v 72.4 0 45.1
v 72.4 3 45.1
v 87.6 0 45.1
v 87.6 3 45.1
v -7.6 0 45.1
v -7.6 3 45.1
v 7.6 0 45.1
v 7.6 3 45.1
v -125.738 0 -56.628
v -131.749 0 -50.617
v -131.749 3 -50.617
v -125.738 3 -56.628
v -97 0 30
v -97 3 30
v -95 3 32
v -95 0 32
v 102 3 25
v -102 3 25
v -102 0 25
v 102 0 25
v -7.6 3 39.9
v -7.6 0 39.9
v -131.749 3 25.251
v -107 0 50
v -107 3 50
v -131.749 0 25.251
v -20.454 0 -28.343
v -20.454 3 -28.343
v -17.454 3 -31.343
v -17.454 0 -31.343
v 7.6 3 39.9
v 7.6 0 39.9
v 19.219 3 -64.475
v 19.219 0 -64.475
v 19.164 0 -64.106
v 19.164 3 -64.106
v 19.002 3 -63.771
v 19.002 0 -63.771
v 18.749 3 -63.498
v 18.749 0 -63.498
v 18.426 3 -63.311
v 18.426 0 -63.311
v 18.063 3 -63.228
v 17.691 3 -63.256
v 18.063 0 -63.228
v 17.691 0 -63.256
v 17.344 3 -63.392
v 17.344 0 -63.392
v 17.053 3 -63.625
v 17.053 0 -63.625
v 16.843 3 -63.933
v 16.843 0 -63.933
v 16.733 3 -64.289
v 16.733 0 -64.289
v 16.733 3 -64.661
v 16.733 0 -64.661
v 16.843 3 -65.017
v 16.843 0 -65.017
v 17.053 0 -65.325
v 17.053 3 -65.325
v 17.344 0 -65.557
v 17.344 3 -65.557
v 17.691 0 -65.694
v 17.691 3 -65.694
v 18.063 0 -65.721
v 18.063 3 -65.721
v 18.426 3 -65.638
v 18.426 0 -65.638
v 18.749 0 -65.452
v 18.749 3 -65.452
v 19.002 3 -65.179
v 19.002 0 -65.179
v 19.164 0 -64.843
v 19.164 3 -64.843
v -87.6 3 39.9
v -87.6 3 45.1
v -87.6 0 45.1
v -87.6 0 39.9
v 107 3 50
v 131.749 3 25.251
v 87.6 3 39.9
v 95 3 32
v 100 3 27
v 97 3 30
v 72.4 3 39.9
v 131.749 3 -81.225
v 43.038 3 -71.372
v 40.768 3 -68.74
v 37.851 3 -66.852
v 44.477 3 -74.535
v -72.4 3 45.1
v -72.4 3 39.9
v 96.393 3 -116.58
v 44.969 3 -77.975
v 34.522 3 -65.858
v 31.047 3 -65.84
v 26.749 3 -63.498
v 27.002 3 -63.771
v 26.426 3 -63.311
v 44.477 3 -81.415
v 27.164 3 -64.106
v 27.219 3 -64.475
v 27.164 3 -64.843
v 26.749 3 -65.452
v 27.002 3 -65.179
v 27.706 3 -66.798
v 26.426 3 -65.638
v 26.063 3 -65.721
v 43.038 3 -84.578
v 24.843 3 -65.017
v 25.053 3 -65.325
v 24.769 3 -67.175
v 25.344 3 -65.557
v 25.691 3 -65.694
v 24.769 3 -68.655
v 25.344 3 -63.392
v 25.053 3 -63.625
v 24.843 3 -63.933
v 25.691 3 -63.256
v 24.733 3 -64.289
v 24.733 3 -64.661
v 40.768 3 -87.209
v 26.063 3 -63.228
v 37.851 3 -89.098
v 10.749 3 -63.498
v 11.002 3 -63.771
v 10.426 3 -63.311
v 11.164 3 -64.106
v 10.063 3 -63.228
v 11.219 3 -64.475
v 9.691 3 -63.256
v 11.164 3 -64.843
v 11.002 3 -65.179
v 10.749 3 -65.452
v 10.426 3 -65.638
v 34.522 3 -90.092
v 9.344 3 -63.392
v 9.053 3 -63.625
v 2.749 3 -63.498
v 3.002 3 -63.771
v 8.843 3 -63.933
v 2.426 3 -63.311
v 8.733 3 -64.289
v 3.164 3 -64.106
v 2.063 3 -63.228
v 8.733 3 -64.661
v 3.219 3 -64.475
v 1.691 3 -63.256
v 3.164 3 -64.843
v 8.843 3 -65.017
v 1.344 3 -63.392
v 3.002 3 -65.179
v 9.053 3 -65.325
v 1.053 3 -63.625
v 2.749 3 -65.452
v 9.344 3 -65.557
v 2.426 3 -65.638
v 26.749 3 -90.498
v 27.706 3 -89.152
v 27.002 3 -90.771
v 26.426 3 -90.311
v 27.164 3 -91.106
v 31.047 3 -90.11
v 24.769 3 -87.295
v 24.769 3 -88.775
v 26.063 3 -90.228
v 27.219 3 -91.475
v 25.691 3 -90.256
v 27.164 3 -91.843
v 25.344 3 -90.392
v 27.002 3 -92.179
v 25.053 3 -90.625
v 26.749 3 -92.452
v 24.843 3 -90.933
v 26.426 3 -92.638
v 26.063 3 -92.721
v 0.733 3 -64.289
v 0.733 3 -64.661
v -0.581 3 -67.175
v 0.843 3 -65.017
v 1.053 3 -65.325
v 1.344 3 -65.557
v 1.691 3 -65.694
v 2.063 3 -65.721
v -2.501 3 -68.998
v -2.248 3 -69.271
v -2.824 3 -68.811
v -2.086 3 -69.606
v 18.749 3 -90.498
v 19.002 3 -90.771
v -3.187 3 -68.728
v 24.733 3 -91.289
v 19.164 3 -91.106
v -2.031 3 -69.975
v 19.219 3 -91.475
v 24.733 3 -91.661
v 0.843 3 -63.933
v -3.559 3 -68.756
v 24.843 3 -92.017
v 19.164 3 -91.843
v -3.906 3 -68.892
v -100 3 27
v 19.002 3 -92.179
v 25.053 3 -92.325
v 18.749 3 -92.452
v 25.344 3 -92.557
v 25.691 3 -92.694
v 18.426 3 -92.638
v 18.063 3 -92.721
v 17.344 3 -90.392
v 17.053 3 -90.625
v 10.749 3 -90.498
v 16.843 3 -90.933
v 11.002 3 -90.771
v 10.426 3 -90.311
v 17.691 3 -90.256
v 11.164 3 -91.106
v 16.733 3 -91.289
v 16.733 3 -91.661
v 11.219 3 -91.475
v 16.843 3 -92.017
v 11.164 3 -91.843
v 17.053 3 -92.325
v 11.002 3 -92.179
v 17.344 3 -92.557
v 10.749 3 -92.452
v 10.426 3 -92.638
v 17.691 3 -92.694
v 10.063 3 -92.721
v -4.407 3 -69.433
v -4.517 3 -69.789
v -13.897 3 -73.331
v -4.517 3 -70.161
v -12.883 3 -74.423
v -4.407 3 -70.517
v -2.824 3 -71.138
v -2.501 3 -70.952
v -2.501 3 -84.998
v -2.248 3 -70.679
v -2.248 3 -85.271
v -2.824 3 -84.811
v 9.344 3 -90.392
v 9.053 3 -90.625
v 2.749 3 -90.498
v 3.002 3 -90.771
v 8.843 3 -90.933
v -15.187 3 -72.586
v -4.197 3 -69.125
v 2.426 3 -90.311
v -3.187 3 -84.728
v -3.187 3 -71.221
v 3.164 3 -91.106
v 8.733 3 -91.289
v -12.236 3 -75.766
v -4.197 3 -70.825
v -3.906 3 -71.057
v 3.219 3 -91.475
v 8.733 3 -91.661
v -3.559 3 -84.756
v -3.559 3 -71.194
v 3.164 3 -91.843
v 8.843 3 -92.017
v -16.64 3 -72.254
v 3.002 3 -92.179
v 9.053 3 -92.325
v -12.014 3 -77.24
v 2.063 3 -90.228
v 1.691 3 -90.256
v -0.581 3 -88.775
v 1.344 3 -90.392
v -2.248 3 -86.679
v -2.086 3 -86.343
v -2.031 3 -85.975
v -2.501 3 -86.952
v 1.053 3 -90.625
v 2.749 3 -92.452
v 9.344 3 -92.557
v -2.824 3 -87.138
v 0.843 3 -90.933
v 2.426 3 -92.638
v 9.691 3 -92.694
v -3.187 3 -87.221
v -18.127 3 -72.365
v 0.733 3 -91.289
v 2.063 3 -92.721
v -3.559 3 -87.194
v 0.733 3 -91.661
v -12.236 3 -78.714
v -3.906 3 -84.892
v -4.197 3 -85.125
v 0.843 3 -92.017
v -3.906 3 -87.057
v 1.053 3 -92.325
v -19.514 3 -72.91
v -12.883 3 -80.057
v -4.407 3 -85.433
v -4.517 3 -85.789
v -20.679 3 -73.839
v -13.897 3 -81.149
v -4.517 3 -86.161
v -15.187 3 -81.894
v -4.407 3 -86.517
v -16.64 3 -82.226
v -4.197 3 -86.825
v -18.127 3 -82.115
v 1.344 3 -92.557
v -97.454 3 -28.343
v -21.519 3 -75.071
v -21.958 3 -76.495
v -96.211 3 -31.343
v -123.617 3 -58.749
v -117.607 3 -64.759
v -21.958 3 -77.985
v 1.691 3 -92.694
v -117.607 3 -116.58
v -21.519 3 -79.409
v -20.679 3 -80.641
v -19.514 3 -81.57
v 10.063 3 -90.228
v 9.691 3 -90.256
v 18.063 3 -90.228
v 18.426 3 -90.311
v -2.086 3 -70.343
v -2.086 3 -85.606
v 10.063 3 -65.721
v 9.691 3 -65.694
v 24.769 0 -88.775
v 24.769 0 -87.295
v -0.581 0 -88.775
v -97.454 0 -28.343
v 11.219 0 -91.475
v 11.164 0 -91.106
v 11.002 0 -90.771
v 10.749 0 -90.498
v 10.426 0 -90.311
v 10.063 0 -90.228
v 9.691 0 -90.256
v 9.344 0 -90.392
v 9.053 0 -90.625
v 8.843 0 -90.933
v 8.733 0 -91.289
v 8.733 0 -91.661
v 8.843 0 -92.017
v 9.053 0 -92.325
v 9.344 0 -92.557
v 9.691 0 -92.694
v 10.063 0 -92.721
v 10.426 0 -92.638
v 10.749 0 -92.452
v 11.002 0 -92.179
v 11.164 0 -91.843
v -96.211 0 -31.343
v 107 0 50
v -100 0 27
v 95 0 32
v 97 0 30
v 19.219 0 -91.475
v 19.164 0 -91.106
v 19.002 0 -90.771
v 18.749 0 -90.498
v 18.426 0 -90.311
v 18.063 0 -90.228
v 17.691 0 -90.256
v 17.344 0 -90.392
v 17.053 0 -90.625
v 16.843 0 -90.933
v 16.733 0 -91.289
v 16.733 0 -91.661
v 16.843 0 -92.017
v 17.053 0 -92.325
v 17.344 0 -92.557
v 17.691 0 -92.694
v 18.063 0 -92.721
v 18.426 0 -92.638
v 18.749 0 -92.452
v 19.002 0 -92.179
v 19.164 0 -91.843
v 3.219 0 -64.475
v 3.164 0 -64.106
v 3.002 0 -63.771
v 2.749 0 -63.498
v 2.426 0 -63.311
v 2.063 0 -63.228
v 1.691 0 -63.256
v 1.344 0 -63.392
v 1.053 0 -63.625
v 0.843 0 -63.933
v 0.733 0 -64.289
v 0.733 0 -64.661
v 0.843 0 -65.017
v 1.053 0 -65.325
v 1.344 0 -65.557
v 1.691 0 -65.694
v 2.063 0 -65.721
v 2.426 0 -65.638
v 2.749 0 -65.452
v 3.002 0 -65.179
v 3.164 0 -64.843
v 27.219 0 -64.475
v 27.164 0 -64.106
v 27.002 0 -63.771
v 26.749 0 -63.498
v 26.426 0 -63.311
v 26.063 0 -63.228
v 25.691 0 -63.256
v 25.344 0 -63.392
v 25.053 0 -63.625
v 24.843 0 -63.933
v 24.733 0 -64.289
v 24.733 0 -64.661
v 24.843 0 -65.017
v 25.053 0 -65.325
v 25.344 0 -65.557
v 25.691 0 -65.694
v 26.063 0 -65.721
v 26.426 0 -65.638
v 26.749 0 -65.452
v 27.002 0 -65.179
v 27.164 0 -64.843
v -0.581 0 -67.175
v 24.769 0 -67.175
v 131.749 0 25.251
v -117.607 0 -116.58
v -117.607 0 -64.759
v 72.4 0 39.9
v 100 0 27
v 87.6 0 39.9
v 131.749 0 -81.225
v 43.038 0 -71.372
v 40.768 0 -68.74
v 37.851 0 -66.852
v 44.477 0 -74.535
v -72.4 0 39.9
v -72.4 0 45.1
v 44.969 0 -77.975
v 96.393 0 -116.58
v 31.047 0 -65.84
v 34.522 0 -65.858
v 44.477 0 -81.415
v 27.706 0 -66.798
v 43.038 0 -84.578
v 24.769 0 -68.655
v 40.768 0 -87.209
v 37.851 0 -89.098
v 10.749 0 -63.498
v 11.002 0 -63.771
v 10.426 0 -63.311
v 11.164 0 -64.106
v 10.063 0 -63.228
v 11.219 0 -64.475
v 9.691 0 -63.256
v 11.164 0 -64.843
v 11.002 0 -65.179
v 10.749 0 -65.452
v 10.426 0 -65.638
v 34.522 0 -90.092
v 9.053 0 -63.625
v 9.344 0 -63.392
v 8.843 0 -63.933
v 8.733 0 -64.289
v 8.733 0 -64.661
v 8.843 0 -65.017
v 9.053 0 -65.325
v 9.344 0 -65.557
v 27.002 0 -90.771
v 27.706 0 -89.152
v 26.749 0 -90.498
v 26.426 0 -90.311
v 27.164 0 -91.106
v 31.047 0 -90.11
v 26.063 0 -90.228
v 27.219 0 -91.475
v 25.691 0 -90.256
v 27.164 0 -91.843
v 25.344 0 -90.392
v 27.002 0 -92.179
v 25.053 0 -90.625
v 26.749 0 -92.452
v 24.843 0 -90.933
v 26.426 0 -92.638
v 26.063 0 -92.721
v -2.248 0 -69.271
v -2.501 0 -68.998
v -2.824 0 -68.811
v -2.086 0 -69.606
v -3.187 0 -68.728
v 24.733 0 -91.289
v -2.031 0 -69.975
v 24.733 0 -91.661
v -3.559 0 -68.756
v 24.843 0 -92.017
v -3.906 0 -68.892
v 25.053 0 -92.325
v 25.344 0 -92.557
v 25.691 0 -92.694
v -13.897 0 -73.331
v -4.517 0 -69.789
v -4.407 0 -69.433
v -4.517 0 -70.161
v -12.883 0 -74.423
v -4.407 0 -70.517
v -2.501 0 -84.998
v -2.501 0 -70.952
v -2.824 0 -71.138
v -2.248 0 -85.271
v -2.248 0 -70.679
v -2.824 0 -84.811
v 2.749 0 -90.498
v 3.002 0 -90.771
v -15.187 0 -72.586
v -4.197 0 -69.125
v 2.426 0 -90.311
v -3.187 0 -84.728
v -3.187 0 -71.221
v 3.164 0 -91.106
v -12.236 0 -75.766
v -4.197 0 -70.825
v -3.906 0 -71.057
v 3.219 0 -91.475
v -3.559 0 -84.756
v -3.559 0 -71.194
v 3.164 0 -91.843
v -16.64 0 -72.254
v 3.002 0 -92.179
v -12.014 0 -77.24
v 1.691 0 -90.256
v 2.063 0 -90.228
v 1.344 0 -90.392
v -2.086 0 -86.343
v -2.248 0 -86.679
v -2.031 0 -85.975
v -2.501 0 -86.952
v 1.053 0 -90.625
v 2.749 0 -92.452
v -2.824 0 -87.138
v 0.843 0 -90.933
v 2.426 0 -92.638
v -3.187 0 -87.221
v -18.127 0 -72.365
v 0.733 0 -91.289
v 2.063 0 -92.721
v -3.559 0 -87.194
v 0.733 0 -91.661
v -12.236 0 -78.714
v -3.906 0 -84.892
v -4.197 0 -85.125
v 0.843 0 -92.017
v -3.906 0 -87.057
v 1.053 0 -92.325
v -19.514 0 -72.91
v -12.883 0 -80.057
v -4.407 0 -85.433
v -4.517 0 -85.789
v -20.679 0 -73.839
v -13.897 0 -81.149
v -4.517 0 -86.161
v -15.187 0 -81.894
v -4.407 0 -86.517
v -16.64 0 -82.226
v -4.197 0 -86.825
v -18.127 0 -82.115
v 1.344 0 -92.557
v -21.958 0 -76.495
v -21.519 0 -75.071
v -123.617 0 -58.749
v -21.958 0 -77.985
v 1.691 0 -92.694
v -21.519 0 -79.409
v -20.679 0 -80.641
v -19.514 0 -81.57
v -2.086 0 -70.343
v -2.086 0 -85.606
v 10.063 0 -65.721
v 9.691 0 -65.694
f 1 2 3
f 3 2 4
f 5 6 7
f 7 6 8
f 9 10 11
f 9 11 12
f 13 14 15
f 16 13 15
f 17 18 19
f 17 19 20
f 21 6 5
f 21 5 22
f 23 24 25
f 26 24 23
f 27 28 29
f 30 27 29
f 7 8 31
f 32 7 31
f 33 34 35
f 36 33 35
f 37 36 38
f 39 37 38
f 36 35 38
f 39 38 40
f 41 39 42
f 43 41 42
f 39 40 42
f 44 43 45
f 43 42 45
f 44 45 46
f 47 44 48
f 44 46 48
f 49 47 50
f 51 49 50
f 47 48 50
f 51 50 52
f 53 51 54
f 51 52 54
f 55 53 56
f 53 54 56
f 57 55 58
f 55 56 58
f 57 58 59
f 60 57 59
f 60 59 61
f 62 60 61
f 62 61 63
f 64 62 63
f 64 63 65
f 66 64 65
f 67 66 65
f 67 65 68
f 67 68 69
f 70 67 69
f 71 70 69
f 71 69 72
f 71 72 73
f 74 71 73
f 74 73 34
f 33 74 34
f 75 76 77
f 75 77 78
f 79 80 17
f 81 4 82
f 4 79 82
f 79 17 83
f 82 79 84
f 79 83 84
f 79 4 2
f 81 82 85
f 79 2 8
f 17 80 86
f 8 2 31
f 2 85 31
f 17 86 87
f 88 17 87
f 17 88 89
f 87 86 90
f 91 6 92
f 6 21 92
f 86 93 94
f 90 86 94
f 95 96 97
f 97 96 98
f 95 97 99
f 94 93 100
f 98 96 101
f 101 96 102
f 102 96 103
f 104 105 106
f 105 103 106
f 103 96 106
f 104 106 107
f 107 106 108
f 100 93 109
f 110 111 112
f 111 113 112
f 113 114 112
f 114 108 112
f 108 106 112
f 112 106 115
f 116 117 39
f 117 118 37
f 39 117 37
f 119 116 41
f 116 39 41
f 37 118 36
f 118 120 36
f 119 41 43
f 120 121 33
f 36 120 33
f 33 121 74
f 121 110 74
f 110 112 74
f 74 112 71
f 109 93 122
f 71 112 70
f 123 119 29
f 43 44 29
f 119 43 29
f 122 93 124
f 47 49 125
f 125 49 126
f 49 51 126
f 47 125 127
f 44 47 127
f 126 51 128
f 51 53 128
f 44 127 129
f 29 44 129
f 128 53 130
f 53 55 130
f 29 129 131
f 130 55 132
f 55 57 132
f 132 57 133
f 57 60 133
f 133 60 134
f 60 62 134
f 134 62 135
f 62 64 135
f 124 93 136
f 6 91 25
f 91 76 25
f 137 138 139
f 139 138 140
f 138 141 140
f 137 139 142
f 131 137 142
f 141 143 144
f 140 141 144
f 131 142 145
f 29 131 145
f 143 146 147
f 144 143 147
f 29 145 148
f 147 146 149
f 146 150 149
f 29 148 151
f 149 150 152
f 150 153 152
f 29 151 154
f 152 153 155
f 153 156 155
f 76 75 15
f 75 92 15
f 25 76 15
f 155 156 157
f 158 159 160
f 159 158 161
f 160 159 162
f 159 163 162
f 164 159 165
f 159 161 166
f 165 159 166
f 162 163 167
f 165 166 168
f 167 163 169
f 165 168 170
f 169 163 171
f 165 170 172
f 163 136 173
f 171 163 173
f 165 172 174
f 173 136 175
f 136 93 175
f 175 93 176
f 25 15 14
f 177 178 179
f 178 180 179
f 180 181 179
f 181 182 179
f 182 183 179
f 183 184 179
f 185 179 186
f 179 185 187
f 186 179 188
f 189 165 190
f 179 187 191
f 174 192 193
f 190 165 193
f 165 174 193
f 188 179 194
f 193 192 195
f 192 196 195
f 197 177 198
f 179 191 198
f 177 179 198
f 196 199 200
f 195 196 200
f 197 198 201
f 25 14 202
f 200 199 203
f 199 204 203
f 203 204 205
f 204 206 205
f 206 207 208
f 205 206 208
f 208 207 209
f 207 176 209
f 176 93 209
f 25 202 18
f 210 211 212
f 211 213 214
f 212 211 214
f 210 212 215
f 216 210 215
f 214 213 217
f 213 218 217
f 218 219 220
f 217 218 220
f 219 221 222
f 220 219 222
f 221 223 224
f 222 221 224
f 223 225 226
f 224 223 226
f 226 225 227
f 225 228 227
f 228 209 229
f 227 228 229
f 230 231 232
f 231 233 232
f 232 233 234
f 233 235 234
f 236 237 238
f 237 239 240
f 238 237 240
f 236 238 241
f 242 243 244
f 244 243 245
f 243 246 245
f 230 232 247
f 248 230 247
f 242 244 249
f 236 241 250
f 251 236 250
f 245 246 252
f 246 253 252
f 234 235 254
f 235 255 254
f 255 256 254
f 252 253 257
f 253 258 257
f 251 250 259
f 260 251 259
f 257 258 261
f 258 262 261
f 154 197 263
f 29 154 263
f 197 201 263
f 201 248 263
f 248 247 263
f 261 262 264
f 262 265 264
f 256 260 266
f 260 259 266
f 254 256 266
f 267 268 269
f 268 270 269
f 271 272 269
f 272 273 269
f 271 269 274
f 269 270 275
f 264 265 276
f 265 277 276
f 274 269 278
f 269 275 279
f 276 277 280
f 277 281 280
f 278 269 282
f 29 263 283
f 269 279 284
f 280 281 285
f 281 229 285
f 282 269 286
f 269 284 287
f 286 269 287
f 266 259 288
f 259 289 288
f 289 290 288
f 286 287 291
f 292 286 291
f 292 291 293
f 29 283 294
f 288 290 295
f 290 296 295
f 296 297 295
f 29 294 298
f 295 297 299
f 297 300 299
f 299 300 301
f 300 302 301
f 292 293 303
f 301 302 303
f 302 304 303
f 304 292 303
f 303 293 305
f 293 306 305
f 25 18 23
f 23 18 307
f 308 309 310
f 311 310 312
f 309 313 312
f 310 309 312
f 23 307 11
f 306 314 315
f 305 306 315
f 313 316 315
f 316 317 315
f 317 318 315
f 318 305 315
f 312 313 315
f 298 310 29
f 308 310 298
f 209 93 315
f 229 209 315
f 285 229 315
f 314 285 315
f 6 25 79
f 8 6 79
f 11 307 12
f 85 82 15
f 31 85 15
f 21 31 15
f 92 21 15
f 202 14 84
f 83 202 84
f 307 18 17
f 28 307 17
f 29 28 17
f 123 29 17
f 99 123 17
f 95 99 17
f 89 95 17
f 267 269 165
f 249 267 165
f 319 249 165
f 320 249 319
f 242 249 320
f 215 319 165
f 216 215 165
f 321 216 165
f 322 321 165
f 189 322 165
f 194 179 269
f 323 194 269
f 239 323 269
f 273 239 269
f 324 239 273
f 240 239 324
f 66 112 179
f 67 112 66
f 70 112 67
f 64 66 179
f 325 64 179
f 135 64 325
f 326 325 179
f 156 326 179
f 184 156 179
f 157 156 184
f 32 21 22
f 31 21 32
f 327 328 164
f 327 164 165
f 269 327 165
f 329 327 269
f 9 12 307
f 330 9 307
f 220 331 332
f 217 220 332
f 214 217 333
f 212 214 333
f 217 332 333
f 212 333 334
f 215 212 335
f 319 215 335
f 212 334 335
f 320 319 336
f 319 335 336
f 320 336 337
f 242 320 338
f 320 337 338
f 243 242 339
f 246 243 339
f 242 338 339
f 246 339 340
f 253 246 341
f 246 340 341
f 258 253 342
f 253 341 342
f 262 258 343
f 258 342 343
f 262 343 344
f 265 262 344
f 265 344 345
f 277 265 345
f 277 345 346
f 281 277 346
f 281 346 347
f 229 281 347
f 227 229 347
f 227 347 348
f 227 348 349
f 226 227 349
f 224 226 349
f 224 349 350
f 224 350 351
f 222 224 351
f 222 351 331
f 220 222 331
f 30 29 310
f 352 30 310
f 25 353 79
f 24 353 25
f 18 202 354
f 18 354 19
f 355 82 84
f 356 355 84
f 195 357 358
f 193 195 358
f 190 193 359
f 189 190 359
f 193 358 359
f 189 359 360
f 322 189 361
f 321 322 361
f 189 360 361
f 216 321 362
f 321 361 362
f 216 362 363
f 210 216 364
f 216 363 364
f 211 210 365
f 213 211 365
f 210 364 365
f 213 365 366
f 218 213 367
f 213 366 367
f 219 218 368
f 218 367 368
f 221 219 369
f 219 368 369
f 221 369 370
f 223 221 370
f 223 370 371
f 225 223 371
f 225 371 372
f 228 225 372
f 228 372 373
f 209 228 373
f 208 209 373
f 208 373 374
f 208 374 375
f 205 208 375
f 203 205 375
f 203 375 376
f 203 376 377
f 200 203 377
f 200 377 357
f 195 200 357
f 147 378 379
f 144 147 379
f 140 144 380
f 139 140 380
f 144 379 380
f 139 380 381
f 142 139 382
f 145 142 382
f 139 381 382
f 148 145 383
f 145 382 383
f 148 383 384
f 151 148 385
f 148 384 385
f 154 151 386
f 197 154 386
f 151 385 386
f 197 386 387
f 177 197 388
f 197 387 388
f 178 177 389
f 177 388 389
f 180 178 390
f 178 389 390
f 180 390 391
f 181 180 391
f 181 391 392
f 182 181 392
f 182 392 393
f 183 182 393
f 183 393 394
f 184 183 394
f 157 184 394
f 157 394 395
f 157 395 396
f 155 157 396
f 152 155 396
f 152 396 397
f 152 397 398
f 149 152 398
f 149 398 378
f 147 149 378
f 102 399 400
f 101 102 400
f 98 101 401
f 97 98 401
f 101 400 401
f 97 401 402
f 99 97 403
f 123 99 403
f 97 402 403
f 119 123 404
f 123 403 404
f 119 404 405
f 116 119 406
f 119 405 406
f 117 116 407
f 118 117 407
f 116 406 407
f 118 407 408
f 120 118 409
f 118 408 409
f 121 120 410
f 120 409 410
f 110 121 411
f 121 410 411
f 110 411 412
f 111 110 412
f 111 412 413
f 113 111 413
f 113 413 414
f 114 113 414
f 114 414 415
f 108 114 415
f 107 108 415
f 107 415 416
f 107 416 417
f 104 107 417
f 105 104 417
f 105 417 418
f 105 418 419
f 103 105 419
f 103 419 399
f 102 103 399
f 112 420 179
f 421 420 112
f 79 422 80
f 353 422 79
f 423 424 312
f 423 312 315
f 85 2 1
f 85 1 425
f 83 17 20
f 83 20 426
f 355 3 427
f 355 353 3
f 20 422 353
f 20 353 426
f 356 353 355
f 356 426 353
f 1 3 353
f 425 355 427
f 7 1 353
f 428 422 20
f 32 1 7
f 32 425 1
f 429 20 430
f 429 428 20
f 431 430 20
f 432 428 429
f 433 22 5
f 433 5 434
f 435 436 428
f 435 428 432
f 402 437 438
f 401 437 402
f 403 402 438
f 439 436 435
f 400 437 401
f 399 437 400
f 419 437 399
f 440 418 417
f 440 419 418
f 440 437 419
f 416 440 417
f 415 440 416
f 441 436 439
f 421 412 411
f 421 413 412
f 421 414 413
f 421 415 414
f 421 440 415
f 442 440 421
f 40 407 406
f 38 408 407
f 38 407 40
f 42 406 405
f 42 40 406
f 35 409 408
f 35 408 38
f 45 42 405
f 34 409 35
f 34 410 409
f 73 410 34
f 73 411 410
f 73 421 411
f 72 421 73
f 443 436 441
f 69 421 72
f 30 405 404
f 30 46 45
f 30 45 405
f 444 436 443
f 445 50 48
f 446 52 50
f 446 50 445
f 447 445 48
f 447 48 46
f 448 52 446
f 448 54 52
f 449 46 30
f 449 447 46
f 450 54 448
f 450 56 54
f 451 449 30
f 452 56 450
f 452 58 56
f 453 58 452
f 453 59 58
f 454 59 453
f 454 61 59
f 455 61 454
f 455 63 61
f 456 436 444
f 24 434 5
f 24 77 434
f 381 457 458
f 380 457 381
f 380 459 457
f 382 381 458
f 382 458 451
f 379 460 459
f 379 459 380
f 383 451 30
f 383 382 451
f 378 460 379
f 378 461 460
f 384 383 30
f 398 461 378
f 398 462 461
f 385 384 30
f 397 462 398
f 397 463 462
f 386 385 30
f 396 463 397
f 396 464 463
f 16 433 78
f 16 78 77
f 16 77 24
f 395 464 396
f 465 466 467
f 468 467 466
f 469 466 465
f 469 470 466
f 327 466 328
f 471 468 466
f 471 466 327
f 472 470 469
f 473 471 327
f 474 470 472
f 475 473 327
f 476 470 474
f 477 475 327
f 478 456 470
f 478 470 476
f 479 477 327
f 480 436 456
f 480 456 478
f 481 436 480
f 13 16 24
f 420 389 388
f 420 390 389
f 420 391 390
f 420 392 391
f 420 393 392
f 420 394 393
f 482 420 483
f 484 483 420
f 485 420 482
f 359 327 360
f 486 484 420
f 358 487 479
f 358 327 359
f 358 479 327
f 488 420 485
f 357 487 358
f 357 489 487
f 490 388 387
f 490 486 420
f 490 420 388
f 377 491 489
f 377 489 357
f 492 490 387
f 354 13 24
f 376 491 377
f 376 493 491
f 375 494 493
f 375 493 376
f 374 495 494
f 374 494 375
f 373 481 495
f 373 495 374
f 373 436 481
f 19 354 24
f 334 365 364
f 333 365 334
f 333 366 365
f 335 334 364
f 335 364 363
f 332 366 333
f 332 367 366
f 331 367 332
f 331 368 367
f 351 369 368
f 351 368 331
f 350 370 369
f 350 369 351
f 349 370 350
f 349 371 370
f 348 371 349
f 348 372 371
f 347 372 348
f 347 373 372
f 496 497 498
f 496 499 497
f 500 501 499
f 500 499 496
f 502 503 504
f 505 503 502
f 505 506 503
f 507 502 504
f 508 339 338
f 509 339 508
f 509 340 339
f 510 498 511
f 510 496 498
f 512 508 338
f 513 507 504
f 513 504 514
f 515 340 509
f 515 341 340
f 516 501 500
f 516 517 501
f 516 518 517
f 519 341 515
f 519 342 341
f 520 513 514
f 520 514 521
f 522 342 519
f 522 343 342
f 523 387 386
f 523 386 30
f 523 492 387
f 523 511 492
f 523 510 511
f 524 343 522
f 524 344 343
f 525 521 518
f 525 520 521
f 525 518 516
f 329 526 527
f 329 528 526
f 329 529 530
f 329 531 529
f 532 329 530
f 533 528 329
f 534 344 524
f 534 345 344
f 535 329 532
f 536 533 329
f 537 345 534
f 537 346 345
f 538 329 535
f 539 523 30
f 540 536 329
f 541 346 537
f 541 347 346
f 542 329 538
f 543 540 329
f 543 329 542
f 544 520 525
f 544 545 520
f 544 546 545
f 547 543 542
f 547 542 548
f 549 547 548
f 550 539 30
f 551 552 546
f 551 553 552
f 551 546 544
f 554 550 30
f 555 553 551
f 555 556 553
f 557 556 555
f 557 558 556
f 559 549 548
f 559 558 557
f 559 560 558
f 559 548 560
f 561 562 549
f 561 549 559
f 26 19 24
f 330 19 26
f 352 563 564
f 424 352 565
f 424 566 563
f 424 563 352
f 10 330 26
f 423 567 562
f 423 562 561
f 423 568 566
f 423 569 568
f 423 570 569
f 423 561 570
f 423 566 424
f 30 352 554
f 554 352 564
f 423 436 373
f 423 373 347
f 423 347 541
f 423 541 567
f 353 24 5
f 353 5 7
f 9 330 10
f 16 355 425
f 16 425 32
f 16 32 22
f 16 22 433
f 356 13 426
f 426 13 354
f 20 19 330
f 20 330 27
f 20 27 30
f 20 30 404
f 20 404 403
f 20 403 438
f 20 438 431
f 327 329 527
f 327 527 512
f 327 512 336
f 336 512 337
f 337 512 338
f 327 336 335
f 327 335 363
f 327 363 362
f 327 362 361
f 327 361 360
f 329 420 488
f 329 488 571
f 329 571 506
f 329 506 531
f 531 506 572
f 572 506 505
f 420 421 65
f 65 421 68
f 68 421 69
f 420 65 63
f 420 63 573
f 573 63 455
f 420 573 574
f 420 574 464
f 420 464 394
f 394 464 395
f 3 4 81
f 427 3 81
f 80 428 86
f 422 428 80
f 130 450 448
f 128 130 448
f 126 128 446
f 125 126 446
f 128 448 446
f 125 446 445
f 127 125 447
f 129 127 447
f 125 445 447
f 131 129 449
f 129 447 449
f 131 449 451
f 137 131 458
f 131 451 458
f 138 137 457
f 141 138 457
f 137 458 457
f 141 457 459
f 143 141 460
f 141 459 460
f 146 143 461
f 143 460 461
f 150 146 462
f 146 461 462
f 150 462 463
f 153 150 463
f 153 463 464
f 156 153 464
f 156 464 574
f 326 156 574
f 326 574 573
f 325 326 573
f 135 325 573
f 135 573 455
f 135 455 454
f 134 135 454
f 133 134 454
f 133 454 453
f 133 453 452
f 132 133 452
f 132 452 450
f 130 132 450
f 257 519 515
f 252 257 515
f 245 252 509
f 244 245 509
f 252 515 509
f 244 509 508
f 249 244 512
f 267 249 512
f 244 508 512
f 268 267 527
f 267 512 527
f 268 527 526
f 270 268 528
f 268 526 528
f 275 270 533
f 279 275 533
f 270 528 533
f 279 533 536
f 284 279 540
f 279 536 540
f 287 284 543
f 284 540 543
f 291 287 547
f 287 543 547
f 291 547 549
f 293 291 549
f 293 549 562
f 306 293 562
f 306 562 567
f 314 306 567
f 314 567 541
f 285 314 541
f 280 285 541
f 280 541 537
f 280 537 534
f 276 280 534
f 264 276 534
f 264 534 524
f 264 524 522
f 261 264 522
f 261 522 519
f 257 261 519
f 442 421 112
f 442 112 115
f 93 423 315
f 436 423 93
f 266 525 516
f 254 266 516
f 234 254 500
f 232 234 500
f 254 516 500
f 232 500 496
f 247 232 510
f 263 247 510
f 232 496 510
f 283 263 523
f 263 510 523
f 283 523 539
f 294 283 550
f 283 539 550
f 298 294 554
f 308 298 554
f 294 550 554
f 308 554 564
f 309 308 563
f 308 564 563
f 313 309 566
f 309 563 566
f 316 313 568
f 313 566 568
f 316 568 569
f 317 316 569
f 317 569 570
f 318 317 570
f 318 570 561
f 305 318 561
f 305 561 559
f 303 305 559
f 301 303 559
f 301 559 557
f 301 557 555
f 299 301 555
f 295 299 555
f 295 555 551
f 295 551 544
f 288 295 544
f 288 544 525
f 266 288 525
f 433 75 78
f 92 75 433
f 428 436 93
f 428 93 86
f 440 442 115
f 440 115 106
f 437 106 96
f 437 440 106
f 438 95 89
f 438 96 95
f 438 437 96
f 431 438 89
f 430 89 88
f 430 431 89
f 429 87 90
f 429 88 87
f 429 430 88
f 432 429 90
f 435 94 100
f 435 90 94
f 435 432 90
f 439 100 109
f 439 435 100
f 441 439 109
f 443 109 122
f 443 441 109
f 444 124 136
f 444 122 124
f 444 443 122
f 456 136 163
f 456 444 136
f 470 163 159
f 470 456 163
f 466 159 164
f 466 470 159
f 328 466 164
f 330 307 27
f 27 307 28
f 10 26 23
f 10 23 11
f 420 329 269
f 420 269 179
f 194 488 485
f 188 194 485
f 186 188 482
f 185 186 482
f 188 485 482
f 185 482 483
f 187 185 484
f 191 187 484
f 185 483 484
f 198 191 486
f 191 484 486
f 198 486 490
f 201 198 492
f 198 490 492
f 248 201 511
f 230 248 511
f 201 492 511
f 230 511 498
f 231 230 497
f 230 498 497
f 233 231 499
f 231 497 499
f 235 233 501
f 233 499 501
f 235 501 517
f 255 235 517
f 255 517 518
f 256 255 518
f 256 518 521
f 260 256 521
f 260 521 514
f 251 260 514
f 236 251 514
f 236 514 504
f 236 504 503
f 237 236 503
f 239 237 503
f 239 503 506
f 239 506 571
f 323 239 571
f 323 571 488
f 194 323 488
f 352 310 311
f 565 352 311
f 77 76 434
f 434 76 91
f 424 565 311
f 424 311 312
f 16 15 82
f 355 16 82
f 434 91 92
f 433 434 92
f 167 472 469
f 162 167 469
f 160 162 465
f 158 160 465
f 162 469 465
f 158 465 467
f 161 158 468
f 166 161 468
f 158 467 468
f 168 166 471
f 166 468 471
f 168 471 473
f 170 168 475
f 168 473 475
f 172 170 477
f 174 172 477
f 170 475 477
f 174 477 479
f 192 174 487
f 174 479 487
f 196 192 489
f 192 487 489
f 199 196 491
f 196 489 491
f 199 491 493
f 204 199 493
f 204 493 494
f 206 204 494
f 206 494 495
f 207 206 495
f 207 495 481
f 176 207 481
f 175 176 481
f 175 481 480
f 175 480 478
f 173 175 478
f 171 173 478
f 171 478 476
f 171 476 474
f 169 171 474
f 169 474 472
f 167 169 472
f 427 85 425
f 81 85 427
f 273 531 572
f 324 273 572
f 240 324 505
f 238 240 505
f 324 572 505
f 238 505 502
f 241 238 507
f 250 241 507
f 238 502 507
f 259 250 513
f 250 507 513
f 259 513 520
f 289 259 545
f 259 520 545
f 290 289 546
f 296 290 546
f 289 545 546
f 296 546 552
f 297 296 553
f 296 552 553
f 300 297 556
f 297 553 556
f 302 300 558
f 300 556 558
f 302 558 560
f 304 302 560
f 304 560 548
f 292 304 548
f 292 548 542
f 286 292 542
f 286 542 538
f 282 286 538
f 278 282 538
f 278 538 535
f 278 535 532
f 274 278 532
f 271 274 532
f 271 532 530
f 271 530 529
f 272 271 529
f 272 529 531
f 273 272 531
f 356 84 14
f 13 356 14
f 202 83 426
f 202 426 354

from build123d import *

# Parameters (mm, degrees)
BOSS_EXTRUDE1_DEPTH         = 3
SKETCH2_W                   = 15
SKETCH2_H                   = 5
DESTEK_BAGLANT_DEPTH        = 4
SKETCH5_R                   = 5
SKETCH5_R_2                 = 1.25
MOTOR_DEPTH                 = 4
CUT_EXTRUDE2_DEPTH          = 4
CUT_EXTRUDE3_DEPTH          = 4
BOSS_EXTRUDE2_DEPTH         = 3
SKETCH9_W                   = 15.2
SKETCH9_H                   = 5.2
DESTEK_BAGLANTI_OFSET_DEPTH = 4


with BuildPart() as part:
    # Sketch1 → Boss-Extrude1 (new body)
    with BuildSketch(Plane(origin=(0, 0, 0), x_dir=(1, 0, 0), z_dir=(0, 1, 0))):
        Polygon((-107, -50), (-131.748737342, -25.251262658), (-131.748737342, 50.617257402), (-117.606601718, 64.759393026), (-117.606601718, 116.580359723), (96.393398282, 116.580359723), (131.748737342, 81.225020664), (131.748737342, -25.251262658), (107, -50), align=None)
    extrude(amount=BOSS_EXTRUDE1_DEPTH)

    # Sketch2 → Destek Baglantı (cut, through all)
    with BuildSketch(Plane(origin=(0, 3, 0), x_dir=(1, 0, 0), z_dir=(0, 1, 0))):
        with Locations((80, -42.5)):
            Rectangle(SKETCH2_W, SKETCH2_H)
        with Locations((0, -42.5)):
            Rectangle(SKETCH2_W, SKETCH2_H)
        with Locations((-80, -42.5)):
            Rectangle(SKETCH2_W, SKETCH2_H)
    extrude(amount=-DESTEK_BAGLANT_DEPTH, mode=Mode.SUBTRACT)

    # Sketch5 → Motor (cut, through all)
    with BuildSketch(Plane.XZ):
        with Locations((-17.014102848, -77.239948703)):
            Circle(SKETCH5_R)
        with Locations((25.969420718, -91.474858406)):
            Circle(SKETCH5_R_2)
        with Locations((17.969420718, -91.474858406)):
            Circle(SKETCH5_R_2)
        with Locations((9.969420718, -91.474858406)):
            Circle(SKETCH5_R_2)
        with Locations((1.969420718, -91.474858406)):
            Circle(SKETCH5_R_2)
        with Locations((-3.280579282, -85.974858406)):
            Circle(SKETCH5_R_2)
        with Locations((-3.280579282, -69.974858406)):
            Circle(SKETCH5_R_2)
        with Locations((1.969420718, -64.474858406)):
            Circle(SKETCH5_R_2)
        with Locations((9.969420718, -64.474858406)):
            Circle(SKETCH5_R_2)
        with Locations((17.969420718, -64.474858406)):
            Circle(SKETCH5_R_2)
        with Locations((25.969420718, -64.474858406)):
            Circle(SKETCH5_R_2)
        with BuildLine():
            Line((24.769420718, -88.774858406), (-0.580579282, -88.774858406))
            Line((-0.580579282, -88.774858406), (-0.580579282, -67.174858406))
            Line((-0.580579282, -67.174858406), (24.769420718, -67.174858406))
            Line((24.769420718, -67.174858406), (24.769420718, -68.654987163))
            ThreePointArc((24.769420718, -68.654987163), (44.969420718, -77.974858406), (24.769420718, -87.29472965))
            Line((24.769420718, -87.29472965), (24.769420718, -88.774858406))
        make_face()
    extrude(amount=-MOTOR_DEPTH, mode=Mode.SUBTRACT)

    # Sketch6 → Cut-Extrude2 (cut, through all)
    with BuildSketch(Plane(origin=(0, 3, 0), x_dir=(1, 0, 0), z_dir=(0, 1, 0))):
        Polygon((-125.738329701, 56.627665042), (-97.454058454, 28.343393795), (-17.454058454, 28.343393795), (-17.454058454, 31.343393795), (-96.211417767, 31.343393795), (-123.617009358, 58.748985386), align=None)
    extrude(amount=-CUT_EXTRUDE2_DEPTH, mode=Mode.SUBTRACT)

    # Sketch7 → Cut-Extrude3 (cut, through all)
    with BuildSketch(Plane(origin=(0, 3, 0), x_dir=(1, 0, 0), z_dir=(0, 1, 0))):
        Polygon((-95, -32), (95, -32), (97, -30), (-97, -30), align=None)
        Polygon((-100, -27), (-102, -25), (102, -25), (100, -27), align=None)
    extrude(amount=-CUT_EXTRUDE3_DEPTH, mode=Mode.SUBTRACT)

    # Sketch8 → Boss-Extrude2 (add, through all)
    with BuildSketch(Plane(origin=(0, 3, 0), x_dir=(1, 0, 0), z_dir=(0, 1, 0))):
        Polygon((-17.454058454, 31.343393795), (-17.454058454, 28.343393795), (-20.454058454, 28.343393795), align=None)
    extrude(amount=-BOSS_EXTRUDE2_DEPTH)

    # Sketch9 → Destek Baglanti Ofset (cut, through all)
    with BuildSketch(Plane(origin=(0, 3, 0), x_dir=(1, 0, 0), z_dir=(0, 1, 0))):
        with Locations((-80, -42.5)):
            Rectangle(SKETCH9_W, SKETCH9_H)
        with Locations((0, -42.5)):
            Rectangle(SKETCH9_W, SKETCH9_H)
        with Locations((80, -42.5)):
            Rectangle(SKETCH9_W, SKETCH9_H)
    extrude(amount=-DESTEK_BAGLANTI_OFSET_DEPTH, mode=Mode.SUBTRACT)


solid = part.part
